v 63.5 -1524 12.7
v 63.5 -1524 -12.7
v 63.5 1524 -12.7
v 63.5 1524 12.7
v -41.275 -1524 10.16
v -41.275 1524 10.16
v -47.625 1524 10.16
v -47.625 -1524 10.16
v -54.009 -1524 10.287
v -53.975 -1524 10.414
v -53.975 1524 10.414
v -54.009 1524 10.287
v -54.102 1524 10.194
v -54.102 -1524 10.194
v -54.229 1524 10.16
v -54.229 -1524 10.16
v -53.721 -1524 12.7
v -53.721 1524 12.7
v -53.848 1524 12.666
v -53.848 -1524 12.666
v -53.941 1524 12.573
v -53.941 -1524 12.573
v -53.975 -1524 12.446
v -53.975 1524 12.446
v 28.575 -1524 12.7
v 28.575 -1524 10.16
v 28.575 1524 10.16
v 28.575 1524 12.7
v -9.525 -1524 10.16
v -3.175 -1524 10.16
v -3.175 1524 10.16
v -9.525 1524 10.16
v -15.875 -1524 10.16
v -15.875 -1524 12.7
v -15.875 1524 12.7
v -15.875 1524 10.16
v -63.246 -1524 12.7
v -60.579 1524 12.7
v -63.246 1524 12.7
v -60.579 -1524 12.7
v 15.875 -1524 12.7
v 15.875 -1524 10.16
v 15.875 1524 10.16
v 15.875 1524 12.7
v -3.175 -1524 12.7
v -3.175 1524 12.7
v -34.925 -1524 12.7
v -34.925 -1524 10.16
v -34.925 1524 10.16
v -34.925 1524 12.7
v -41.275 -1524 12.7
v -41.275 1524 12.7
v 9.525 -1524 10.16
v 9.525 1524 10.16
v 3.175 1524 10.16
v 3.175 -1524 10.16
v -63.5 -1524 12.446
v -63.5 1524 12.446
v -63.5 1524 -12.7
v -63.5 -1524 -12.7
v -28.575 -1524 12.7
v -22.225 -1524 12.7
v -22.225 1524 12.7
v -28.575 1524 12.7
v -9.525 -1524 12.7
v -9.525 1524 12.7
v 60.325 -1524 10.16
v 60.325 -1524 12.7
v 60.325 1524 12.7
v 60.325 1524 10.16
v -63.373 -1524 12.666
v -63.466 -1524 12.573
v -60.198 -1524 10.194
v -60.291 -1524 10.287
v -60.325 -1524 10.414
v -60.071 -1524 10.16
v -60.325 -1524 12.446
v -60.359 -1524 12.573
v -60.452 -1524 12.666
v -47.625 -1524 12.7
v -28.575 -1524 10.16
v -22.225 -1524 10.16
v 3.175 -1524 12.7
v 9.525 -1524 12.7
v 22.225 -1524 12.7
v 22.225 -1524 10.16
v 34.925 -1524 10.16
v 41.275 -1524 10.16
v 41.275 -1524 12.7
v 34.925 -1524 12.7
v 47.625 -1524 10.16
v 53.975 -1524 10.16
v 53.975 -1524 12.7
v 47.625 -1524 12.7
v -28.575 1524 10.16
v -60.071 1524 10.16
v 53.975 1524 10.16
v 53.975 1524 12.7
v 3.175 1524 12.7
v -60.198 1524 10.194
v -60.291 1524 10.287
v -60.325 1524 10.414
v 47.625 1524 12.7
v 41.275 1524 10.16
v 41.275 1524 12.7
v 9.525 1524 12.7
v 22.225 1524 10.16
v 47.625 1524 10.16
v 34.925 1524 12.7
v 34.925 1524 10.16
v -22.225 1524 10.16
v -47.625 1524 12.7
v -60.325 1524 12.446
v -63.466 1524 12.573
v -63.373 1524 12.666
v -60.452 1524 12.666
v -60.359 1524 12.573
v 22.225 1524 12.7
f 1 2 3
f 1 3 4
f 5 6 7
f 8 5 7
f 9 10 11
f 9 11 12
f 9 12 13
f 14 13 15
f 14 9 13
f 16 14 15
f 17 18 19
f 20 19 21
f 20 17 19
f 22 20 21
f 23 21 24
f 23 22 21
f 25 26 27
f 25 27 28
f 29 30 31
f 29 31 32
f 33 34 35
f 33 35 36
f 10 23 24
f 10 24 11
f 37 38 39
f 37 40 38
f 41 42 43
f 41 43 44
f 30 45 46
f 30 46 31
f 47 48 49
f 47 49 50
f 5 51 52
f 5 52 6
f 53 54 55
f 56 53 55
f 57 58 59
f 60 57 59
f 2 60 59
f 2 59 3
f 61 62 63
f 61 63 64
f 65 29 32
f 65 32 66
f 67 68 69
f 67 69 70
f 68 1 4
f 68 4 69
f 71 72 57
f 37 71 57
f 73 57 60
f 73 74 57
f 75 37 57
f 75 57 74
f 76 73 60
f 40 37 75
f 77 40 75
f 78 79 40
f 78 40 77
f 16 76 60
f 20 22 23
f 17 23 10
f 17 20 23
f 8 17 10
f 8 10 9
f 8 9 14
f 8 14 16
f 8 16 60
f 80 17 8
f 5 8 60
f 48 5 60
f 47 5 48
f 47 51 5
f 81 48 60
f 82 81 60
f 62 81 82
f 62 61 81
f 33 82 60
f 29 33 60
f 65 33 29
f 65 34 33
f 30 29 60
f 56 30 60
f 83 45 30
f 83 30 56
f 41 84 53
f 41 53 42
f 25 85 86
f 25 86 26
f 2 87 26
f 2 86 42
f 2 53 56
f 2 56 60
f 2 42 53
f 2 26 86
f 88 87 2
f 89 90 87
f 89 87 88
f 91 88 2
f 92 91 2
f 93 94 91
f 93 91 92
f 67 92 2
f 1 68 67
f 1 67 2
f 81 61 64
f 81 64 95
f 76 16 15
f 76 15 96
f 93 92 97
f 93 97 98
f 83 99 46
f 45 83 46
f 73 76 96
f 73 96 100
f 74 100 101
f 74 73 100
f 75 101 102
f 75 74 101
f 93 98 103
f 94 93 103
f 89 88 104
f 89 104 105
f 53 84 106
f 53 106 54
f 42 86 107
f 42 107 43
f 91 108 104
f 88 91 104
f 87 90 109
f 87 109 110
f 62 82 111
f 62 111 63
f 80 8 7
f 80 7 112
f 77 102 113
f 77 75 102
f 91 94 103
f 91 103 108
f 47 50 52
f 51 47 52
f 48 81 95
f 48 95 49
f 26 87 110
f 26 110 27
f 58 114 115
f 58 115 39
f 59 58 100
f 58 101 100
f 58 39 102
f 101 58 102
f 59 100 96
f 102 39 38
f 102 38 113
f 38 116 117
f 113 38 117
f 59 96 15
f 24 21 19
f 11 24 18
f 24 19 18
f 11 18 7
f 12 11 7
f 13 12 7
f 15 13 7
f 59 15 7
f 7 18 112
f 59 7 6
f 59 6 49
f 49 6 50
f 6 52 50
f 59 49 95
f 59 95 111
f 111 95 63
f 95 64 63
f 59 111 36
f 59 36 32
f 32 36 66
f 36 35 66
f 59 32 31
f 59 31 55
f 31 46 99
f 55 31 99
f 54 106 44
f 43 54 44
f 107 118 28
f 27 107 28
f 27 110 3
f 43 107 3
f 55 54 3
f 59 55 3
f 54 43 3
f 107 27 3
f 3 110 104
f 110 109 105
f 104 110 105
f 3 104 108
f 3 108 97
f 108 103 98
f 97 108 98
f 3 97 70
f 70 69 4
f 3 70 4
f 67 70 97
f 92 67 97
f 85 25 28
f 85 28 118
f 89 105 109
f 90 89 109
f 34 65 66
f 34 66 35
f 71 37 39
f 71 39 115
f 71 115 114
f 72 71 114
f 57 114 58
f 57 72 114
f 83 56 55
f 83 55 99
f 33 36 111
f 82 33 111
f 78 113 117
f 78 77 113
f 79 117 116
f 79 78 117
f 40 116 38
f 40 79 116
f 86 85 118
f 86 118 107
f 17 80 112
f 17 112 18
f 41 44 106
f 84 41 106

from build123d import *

# Parameters (mm, degrees)
F1_DEPTH = 1524


with BuildPart() as f1:
    # F0 (on Front) → F1 (new body, symmetric)
    with BuildSketch(Plane.XZ):
        with BuildLine():
            Line((-60.579, 12.7), (-63.246, 12.7))
            ThreePointArc((-63.246, 12.7), (-63.425605, 12.625605), (-63.5, 12.446))
            Line((-63.5, 12.446), (-63.5, -12.7))
            Line((-63.5, -12.7), (63.5, -12.7))
            Line((63.5, -12.7), (63.5, 12.7))
            Line((63.5, 12.7), (60.325, 12.7))
            Line((60.325, 12.7), (60.325, 10.16))
            Line((60.325, 10.16), (53.975, 10.16))
            Line((53.975, 10.16), (53.975, 12.7))
            Line((53.975, 12.7), (47.625, 12.7))
            Line((47.625, 12.7), (47.625, 10.16))
            Line((47.625, 10.16), (41.275, 10.16))
            Line((41.275, 10.16), (41.275, 12.7))
            Line((41.275, 12.7), (34.925, 12.7))
            Line((34.925, 12.7), (34.925, 10.16))
            Line((34.925, 10.16), (28.575, 10.16))
            Line((28.575, 10.16), (28.575, 12.7))
            Line((28.575, 12.7), (22.225, 12.7))
            Line((22.225, 12.7), (22.225, 10.16))
            Line((22.225, 10.16), (15.875, 10.16))
            Line((15.875, 10.16), (15.875, 12.7))
            Line((15.875, 12.7), (9.525, 12.7))
            Line((9.525, 12.7), (9.525, 10.16))
            Line((9.525, 10.16), (3.175, 10.16))
            Line((3.175, 10.16), (3.175, 12.7))
            Line((3.175, 12.7), (-3.175, 12.7))
            Line((-3.175, 12.7), (-3.175, 10.16))
            Line((-3.175, 10.16), (-9.525, 10.16))
            Line((-9.525, 10.16), (-9.525, 12.7))
            Line((-9.525, 12.7), (-15.875, 12.7))
            Line((-15.875, 12.7), (-15.875, 10.16))
            Line((-15.875, 10.16), (-22.225, 10.16))
            Line((-22.225, 10.16), (-22.225, 12.7))
            Line((-22.225, 12.7), (-28.575, 12.7))
            Line((-28.575, 12.7), (-28.575, 10.16))
            Line((-28.575, 10.16), (-34.925, 10.16))
            Line((-34.925, 10.16), (-34.925, 12.7))
            Line((-34.925, 12.7), (-41.275, 12.7))
            Line((-41.275, 12.7), (-41.275, 10.16))
            Line((-41.275, 10.16), (-47.625, 10.16))
            Line((-47.625, 10.16), (-47.625, 12.7))
            Line((-47.625, 12.7), (-53.721, 12.7))
            ThreePointArc((-53.721, 12.7), (-53.900605, 12.625605), (-53.975, 12.446))
            Line((-53.975, 12.446), (-53.975, 10.414))
            ThreePointArc((-53.975, 10.414), (-54.049395, 10.234395), (-54.229, 10.16))
            Line((-54.229, 10.16), (-60.071, 10.16))
            ThreePointArc((-60.071, 10.16), (-60.250605, 10.234395), (-60.325, 10.414))
            Line((-60.325, 10.414), (-60.325, 12.446))
            ThreePointArc((-60.325, 12.446), (-60.399395, 12.625605), (-60.579, 12.7))
        make_face()
    extrude(amount=F1_DEPTH, both=True)


solid = f1.part
